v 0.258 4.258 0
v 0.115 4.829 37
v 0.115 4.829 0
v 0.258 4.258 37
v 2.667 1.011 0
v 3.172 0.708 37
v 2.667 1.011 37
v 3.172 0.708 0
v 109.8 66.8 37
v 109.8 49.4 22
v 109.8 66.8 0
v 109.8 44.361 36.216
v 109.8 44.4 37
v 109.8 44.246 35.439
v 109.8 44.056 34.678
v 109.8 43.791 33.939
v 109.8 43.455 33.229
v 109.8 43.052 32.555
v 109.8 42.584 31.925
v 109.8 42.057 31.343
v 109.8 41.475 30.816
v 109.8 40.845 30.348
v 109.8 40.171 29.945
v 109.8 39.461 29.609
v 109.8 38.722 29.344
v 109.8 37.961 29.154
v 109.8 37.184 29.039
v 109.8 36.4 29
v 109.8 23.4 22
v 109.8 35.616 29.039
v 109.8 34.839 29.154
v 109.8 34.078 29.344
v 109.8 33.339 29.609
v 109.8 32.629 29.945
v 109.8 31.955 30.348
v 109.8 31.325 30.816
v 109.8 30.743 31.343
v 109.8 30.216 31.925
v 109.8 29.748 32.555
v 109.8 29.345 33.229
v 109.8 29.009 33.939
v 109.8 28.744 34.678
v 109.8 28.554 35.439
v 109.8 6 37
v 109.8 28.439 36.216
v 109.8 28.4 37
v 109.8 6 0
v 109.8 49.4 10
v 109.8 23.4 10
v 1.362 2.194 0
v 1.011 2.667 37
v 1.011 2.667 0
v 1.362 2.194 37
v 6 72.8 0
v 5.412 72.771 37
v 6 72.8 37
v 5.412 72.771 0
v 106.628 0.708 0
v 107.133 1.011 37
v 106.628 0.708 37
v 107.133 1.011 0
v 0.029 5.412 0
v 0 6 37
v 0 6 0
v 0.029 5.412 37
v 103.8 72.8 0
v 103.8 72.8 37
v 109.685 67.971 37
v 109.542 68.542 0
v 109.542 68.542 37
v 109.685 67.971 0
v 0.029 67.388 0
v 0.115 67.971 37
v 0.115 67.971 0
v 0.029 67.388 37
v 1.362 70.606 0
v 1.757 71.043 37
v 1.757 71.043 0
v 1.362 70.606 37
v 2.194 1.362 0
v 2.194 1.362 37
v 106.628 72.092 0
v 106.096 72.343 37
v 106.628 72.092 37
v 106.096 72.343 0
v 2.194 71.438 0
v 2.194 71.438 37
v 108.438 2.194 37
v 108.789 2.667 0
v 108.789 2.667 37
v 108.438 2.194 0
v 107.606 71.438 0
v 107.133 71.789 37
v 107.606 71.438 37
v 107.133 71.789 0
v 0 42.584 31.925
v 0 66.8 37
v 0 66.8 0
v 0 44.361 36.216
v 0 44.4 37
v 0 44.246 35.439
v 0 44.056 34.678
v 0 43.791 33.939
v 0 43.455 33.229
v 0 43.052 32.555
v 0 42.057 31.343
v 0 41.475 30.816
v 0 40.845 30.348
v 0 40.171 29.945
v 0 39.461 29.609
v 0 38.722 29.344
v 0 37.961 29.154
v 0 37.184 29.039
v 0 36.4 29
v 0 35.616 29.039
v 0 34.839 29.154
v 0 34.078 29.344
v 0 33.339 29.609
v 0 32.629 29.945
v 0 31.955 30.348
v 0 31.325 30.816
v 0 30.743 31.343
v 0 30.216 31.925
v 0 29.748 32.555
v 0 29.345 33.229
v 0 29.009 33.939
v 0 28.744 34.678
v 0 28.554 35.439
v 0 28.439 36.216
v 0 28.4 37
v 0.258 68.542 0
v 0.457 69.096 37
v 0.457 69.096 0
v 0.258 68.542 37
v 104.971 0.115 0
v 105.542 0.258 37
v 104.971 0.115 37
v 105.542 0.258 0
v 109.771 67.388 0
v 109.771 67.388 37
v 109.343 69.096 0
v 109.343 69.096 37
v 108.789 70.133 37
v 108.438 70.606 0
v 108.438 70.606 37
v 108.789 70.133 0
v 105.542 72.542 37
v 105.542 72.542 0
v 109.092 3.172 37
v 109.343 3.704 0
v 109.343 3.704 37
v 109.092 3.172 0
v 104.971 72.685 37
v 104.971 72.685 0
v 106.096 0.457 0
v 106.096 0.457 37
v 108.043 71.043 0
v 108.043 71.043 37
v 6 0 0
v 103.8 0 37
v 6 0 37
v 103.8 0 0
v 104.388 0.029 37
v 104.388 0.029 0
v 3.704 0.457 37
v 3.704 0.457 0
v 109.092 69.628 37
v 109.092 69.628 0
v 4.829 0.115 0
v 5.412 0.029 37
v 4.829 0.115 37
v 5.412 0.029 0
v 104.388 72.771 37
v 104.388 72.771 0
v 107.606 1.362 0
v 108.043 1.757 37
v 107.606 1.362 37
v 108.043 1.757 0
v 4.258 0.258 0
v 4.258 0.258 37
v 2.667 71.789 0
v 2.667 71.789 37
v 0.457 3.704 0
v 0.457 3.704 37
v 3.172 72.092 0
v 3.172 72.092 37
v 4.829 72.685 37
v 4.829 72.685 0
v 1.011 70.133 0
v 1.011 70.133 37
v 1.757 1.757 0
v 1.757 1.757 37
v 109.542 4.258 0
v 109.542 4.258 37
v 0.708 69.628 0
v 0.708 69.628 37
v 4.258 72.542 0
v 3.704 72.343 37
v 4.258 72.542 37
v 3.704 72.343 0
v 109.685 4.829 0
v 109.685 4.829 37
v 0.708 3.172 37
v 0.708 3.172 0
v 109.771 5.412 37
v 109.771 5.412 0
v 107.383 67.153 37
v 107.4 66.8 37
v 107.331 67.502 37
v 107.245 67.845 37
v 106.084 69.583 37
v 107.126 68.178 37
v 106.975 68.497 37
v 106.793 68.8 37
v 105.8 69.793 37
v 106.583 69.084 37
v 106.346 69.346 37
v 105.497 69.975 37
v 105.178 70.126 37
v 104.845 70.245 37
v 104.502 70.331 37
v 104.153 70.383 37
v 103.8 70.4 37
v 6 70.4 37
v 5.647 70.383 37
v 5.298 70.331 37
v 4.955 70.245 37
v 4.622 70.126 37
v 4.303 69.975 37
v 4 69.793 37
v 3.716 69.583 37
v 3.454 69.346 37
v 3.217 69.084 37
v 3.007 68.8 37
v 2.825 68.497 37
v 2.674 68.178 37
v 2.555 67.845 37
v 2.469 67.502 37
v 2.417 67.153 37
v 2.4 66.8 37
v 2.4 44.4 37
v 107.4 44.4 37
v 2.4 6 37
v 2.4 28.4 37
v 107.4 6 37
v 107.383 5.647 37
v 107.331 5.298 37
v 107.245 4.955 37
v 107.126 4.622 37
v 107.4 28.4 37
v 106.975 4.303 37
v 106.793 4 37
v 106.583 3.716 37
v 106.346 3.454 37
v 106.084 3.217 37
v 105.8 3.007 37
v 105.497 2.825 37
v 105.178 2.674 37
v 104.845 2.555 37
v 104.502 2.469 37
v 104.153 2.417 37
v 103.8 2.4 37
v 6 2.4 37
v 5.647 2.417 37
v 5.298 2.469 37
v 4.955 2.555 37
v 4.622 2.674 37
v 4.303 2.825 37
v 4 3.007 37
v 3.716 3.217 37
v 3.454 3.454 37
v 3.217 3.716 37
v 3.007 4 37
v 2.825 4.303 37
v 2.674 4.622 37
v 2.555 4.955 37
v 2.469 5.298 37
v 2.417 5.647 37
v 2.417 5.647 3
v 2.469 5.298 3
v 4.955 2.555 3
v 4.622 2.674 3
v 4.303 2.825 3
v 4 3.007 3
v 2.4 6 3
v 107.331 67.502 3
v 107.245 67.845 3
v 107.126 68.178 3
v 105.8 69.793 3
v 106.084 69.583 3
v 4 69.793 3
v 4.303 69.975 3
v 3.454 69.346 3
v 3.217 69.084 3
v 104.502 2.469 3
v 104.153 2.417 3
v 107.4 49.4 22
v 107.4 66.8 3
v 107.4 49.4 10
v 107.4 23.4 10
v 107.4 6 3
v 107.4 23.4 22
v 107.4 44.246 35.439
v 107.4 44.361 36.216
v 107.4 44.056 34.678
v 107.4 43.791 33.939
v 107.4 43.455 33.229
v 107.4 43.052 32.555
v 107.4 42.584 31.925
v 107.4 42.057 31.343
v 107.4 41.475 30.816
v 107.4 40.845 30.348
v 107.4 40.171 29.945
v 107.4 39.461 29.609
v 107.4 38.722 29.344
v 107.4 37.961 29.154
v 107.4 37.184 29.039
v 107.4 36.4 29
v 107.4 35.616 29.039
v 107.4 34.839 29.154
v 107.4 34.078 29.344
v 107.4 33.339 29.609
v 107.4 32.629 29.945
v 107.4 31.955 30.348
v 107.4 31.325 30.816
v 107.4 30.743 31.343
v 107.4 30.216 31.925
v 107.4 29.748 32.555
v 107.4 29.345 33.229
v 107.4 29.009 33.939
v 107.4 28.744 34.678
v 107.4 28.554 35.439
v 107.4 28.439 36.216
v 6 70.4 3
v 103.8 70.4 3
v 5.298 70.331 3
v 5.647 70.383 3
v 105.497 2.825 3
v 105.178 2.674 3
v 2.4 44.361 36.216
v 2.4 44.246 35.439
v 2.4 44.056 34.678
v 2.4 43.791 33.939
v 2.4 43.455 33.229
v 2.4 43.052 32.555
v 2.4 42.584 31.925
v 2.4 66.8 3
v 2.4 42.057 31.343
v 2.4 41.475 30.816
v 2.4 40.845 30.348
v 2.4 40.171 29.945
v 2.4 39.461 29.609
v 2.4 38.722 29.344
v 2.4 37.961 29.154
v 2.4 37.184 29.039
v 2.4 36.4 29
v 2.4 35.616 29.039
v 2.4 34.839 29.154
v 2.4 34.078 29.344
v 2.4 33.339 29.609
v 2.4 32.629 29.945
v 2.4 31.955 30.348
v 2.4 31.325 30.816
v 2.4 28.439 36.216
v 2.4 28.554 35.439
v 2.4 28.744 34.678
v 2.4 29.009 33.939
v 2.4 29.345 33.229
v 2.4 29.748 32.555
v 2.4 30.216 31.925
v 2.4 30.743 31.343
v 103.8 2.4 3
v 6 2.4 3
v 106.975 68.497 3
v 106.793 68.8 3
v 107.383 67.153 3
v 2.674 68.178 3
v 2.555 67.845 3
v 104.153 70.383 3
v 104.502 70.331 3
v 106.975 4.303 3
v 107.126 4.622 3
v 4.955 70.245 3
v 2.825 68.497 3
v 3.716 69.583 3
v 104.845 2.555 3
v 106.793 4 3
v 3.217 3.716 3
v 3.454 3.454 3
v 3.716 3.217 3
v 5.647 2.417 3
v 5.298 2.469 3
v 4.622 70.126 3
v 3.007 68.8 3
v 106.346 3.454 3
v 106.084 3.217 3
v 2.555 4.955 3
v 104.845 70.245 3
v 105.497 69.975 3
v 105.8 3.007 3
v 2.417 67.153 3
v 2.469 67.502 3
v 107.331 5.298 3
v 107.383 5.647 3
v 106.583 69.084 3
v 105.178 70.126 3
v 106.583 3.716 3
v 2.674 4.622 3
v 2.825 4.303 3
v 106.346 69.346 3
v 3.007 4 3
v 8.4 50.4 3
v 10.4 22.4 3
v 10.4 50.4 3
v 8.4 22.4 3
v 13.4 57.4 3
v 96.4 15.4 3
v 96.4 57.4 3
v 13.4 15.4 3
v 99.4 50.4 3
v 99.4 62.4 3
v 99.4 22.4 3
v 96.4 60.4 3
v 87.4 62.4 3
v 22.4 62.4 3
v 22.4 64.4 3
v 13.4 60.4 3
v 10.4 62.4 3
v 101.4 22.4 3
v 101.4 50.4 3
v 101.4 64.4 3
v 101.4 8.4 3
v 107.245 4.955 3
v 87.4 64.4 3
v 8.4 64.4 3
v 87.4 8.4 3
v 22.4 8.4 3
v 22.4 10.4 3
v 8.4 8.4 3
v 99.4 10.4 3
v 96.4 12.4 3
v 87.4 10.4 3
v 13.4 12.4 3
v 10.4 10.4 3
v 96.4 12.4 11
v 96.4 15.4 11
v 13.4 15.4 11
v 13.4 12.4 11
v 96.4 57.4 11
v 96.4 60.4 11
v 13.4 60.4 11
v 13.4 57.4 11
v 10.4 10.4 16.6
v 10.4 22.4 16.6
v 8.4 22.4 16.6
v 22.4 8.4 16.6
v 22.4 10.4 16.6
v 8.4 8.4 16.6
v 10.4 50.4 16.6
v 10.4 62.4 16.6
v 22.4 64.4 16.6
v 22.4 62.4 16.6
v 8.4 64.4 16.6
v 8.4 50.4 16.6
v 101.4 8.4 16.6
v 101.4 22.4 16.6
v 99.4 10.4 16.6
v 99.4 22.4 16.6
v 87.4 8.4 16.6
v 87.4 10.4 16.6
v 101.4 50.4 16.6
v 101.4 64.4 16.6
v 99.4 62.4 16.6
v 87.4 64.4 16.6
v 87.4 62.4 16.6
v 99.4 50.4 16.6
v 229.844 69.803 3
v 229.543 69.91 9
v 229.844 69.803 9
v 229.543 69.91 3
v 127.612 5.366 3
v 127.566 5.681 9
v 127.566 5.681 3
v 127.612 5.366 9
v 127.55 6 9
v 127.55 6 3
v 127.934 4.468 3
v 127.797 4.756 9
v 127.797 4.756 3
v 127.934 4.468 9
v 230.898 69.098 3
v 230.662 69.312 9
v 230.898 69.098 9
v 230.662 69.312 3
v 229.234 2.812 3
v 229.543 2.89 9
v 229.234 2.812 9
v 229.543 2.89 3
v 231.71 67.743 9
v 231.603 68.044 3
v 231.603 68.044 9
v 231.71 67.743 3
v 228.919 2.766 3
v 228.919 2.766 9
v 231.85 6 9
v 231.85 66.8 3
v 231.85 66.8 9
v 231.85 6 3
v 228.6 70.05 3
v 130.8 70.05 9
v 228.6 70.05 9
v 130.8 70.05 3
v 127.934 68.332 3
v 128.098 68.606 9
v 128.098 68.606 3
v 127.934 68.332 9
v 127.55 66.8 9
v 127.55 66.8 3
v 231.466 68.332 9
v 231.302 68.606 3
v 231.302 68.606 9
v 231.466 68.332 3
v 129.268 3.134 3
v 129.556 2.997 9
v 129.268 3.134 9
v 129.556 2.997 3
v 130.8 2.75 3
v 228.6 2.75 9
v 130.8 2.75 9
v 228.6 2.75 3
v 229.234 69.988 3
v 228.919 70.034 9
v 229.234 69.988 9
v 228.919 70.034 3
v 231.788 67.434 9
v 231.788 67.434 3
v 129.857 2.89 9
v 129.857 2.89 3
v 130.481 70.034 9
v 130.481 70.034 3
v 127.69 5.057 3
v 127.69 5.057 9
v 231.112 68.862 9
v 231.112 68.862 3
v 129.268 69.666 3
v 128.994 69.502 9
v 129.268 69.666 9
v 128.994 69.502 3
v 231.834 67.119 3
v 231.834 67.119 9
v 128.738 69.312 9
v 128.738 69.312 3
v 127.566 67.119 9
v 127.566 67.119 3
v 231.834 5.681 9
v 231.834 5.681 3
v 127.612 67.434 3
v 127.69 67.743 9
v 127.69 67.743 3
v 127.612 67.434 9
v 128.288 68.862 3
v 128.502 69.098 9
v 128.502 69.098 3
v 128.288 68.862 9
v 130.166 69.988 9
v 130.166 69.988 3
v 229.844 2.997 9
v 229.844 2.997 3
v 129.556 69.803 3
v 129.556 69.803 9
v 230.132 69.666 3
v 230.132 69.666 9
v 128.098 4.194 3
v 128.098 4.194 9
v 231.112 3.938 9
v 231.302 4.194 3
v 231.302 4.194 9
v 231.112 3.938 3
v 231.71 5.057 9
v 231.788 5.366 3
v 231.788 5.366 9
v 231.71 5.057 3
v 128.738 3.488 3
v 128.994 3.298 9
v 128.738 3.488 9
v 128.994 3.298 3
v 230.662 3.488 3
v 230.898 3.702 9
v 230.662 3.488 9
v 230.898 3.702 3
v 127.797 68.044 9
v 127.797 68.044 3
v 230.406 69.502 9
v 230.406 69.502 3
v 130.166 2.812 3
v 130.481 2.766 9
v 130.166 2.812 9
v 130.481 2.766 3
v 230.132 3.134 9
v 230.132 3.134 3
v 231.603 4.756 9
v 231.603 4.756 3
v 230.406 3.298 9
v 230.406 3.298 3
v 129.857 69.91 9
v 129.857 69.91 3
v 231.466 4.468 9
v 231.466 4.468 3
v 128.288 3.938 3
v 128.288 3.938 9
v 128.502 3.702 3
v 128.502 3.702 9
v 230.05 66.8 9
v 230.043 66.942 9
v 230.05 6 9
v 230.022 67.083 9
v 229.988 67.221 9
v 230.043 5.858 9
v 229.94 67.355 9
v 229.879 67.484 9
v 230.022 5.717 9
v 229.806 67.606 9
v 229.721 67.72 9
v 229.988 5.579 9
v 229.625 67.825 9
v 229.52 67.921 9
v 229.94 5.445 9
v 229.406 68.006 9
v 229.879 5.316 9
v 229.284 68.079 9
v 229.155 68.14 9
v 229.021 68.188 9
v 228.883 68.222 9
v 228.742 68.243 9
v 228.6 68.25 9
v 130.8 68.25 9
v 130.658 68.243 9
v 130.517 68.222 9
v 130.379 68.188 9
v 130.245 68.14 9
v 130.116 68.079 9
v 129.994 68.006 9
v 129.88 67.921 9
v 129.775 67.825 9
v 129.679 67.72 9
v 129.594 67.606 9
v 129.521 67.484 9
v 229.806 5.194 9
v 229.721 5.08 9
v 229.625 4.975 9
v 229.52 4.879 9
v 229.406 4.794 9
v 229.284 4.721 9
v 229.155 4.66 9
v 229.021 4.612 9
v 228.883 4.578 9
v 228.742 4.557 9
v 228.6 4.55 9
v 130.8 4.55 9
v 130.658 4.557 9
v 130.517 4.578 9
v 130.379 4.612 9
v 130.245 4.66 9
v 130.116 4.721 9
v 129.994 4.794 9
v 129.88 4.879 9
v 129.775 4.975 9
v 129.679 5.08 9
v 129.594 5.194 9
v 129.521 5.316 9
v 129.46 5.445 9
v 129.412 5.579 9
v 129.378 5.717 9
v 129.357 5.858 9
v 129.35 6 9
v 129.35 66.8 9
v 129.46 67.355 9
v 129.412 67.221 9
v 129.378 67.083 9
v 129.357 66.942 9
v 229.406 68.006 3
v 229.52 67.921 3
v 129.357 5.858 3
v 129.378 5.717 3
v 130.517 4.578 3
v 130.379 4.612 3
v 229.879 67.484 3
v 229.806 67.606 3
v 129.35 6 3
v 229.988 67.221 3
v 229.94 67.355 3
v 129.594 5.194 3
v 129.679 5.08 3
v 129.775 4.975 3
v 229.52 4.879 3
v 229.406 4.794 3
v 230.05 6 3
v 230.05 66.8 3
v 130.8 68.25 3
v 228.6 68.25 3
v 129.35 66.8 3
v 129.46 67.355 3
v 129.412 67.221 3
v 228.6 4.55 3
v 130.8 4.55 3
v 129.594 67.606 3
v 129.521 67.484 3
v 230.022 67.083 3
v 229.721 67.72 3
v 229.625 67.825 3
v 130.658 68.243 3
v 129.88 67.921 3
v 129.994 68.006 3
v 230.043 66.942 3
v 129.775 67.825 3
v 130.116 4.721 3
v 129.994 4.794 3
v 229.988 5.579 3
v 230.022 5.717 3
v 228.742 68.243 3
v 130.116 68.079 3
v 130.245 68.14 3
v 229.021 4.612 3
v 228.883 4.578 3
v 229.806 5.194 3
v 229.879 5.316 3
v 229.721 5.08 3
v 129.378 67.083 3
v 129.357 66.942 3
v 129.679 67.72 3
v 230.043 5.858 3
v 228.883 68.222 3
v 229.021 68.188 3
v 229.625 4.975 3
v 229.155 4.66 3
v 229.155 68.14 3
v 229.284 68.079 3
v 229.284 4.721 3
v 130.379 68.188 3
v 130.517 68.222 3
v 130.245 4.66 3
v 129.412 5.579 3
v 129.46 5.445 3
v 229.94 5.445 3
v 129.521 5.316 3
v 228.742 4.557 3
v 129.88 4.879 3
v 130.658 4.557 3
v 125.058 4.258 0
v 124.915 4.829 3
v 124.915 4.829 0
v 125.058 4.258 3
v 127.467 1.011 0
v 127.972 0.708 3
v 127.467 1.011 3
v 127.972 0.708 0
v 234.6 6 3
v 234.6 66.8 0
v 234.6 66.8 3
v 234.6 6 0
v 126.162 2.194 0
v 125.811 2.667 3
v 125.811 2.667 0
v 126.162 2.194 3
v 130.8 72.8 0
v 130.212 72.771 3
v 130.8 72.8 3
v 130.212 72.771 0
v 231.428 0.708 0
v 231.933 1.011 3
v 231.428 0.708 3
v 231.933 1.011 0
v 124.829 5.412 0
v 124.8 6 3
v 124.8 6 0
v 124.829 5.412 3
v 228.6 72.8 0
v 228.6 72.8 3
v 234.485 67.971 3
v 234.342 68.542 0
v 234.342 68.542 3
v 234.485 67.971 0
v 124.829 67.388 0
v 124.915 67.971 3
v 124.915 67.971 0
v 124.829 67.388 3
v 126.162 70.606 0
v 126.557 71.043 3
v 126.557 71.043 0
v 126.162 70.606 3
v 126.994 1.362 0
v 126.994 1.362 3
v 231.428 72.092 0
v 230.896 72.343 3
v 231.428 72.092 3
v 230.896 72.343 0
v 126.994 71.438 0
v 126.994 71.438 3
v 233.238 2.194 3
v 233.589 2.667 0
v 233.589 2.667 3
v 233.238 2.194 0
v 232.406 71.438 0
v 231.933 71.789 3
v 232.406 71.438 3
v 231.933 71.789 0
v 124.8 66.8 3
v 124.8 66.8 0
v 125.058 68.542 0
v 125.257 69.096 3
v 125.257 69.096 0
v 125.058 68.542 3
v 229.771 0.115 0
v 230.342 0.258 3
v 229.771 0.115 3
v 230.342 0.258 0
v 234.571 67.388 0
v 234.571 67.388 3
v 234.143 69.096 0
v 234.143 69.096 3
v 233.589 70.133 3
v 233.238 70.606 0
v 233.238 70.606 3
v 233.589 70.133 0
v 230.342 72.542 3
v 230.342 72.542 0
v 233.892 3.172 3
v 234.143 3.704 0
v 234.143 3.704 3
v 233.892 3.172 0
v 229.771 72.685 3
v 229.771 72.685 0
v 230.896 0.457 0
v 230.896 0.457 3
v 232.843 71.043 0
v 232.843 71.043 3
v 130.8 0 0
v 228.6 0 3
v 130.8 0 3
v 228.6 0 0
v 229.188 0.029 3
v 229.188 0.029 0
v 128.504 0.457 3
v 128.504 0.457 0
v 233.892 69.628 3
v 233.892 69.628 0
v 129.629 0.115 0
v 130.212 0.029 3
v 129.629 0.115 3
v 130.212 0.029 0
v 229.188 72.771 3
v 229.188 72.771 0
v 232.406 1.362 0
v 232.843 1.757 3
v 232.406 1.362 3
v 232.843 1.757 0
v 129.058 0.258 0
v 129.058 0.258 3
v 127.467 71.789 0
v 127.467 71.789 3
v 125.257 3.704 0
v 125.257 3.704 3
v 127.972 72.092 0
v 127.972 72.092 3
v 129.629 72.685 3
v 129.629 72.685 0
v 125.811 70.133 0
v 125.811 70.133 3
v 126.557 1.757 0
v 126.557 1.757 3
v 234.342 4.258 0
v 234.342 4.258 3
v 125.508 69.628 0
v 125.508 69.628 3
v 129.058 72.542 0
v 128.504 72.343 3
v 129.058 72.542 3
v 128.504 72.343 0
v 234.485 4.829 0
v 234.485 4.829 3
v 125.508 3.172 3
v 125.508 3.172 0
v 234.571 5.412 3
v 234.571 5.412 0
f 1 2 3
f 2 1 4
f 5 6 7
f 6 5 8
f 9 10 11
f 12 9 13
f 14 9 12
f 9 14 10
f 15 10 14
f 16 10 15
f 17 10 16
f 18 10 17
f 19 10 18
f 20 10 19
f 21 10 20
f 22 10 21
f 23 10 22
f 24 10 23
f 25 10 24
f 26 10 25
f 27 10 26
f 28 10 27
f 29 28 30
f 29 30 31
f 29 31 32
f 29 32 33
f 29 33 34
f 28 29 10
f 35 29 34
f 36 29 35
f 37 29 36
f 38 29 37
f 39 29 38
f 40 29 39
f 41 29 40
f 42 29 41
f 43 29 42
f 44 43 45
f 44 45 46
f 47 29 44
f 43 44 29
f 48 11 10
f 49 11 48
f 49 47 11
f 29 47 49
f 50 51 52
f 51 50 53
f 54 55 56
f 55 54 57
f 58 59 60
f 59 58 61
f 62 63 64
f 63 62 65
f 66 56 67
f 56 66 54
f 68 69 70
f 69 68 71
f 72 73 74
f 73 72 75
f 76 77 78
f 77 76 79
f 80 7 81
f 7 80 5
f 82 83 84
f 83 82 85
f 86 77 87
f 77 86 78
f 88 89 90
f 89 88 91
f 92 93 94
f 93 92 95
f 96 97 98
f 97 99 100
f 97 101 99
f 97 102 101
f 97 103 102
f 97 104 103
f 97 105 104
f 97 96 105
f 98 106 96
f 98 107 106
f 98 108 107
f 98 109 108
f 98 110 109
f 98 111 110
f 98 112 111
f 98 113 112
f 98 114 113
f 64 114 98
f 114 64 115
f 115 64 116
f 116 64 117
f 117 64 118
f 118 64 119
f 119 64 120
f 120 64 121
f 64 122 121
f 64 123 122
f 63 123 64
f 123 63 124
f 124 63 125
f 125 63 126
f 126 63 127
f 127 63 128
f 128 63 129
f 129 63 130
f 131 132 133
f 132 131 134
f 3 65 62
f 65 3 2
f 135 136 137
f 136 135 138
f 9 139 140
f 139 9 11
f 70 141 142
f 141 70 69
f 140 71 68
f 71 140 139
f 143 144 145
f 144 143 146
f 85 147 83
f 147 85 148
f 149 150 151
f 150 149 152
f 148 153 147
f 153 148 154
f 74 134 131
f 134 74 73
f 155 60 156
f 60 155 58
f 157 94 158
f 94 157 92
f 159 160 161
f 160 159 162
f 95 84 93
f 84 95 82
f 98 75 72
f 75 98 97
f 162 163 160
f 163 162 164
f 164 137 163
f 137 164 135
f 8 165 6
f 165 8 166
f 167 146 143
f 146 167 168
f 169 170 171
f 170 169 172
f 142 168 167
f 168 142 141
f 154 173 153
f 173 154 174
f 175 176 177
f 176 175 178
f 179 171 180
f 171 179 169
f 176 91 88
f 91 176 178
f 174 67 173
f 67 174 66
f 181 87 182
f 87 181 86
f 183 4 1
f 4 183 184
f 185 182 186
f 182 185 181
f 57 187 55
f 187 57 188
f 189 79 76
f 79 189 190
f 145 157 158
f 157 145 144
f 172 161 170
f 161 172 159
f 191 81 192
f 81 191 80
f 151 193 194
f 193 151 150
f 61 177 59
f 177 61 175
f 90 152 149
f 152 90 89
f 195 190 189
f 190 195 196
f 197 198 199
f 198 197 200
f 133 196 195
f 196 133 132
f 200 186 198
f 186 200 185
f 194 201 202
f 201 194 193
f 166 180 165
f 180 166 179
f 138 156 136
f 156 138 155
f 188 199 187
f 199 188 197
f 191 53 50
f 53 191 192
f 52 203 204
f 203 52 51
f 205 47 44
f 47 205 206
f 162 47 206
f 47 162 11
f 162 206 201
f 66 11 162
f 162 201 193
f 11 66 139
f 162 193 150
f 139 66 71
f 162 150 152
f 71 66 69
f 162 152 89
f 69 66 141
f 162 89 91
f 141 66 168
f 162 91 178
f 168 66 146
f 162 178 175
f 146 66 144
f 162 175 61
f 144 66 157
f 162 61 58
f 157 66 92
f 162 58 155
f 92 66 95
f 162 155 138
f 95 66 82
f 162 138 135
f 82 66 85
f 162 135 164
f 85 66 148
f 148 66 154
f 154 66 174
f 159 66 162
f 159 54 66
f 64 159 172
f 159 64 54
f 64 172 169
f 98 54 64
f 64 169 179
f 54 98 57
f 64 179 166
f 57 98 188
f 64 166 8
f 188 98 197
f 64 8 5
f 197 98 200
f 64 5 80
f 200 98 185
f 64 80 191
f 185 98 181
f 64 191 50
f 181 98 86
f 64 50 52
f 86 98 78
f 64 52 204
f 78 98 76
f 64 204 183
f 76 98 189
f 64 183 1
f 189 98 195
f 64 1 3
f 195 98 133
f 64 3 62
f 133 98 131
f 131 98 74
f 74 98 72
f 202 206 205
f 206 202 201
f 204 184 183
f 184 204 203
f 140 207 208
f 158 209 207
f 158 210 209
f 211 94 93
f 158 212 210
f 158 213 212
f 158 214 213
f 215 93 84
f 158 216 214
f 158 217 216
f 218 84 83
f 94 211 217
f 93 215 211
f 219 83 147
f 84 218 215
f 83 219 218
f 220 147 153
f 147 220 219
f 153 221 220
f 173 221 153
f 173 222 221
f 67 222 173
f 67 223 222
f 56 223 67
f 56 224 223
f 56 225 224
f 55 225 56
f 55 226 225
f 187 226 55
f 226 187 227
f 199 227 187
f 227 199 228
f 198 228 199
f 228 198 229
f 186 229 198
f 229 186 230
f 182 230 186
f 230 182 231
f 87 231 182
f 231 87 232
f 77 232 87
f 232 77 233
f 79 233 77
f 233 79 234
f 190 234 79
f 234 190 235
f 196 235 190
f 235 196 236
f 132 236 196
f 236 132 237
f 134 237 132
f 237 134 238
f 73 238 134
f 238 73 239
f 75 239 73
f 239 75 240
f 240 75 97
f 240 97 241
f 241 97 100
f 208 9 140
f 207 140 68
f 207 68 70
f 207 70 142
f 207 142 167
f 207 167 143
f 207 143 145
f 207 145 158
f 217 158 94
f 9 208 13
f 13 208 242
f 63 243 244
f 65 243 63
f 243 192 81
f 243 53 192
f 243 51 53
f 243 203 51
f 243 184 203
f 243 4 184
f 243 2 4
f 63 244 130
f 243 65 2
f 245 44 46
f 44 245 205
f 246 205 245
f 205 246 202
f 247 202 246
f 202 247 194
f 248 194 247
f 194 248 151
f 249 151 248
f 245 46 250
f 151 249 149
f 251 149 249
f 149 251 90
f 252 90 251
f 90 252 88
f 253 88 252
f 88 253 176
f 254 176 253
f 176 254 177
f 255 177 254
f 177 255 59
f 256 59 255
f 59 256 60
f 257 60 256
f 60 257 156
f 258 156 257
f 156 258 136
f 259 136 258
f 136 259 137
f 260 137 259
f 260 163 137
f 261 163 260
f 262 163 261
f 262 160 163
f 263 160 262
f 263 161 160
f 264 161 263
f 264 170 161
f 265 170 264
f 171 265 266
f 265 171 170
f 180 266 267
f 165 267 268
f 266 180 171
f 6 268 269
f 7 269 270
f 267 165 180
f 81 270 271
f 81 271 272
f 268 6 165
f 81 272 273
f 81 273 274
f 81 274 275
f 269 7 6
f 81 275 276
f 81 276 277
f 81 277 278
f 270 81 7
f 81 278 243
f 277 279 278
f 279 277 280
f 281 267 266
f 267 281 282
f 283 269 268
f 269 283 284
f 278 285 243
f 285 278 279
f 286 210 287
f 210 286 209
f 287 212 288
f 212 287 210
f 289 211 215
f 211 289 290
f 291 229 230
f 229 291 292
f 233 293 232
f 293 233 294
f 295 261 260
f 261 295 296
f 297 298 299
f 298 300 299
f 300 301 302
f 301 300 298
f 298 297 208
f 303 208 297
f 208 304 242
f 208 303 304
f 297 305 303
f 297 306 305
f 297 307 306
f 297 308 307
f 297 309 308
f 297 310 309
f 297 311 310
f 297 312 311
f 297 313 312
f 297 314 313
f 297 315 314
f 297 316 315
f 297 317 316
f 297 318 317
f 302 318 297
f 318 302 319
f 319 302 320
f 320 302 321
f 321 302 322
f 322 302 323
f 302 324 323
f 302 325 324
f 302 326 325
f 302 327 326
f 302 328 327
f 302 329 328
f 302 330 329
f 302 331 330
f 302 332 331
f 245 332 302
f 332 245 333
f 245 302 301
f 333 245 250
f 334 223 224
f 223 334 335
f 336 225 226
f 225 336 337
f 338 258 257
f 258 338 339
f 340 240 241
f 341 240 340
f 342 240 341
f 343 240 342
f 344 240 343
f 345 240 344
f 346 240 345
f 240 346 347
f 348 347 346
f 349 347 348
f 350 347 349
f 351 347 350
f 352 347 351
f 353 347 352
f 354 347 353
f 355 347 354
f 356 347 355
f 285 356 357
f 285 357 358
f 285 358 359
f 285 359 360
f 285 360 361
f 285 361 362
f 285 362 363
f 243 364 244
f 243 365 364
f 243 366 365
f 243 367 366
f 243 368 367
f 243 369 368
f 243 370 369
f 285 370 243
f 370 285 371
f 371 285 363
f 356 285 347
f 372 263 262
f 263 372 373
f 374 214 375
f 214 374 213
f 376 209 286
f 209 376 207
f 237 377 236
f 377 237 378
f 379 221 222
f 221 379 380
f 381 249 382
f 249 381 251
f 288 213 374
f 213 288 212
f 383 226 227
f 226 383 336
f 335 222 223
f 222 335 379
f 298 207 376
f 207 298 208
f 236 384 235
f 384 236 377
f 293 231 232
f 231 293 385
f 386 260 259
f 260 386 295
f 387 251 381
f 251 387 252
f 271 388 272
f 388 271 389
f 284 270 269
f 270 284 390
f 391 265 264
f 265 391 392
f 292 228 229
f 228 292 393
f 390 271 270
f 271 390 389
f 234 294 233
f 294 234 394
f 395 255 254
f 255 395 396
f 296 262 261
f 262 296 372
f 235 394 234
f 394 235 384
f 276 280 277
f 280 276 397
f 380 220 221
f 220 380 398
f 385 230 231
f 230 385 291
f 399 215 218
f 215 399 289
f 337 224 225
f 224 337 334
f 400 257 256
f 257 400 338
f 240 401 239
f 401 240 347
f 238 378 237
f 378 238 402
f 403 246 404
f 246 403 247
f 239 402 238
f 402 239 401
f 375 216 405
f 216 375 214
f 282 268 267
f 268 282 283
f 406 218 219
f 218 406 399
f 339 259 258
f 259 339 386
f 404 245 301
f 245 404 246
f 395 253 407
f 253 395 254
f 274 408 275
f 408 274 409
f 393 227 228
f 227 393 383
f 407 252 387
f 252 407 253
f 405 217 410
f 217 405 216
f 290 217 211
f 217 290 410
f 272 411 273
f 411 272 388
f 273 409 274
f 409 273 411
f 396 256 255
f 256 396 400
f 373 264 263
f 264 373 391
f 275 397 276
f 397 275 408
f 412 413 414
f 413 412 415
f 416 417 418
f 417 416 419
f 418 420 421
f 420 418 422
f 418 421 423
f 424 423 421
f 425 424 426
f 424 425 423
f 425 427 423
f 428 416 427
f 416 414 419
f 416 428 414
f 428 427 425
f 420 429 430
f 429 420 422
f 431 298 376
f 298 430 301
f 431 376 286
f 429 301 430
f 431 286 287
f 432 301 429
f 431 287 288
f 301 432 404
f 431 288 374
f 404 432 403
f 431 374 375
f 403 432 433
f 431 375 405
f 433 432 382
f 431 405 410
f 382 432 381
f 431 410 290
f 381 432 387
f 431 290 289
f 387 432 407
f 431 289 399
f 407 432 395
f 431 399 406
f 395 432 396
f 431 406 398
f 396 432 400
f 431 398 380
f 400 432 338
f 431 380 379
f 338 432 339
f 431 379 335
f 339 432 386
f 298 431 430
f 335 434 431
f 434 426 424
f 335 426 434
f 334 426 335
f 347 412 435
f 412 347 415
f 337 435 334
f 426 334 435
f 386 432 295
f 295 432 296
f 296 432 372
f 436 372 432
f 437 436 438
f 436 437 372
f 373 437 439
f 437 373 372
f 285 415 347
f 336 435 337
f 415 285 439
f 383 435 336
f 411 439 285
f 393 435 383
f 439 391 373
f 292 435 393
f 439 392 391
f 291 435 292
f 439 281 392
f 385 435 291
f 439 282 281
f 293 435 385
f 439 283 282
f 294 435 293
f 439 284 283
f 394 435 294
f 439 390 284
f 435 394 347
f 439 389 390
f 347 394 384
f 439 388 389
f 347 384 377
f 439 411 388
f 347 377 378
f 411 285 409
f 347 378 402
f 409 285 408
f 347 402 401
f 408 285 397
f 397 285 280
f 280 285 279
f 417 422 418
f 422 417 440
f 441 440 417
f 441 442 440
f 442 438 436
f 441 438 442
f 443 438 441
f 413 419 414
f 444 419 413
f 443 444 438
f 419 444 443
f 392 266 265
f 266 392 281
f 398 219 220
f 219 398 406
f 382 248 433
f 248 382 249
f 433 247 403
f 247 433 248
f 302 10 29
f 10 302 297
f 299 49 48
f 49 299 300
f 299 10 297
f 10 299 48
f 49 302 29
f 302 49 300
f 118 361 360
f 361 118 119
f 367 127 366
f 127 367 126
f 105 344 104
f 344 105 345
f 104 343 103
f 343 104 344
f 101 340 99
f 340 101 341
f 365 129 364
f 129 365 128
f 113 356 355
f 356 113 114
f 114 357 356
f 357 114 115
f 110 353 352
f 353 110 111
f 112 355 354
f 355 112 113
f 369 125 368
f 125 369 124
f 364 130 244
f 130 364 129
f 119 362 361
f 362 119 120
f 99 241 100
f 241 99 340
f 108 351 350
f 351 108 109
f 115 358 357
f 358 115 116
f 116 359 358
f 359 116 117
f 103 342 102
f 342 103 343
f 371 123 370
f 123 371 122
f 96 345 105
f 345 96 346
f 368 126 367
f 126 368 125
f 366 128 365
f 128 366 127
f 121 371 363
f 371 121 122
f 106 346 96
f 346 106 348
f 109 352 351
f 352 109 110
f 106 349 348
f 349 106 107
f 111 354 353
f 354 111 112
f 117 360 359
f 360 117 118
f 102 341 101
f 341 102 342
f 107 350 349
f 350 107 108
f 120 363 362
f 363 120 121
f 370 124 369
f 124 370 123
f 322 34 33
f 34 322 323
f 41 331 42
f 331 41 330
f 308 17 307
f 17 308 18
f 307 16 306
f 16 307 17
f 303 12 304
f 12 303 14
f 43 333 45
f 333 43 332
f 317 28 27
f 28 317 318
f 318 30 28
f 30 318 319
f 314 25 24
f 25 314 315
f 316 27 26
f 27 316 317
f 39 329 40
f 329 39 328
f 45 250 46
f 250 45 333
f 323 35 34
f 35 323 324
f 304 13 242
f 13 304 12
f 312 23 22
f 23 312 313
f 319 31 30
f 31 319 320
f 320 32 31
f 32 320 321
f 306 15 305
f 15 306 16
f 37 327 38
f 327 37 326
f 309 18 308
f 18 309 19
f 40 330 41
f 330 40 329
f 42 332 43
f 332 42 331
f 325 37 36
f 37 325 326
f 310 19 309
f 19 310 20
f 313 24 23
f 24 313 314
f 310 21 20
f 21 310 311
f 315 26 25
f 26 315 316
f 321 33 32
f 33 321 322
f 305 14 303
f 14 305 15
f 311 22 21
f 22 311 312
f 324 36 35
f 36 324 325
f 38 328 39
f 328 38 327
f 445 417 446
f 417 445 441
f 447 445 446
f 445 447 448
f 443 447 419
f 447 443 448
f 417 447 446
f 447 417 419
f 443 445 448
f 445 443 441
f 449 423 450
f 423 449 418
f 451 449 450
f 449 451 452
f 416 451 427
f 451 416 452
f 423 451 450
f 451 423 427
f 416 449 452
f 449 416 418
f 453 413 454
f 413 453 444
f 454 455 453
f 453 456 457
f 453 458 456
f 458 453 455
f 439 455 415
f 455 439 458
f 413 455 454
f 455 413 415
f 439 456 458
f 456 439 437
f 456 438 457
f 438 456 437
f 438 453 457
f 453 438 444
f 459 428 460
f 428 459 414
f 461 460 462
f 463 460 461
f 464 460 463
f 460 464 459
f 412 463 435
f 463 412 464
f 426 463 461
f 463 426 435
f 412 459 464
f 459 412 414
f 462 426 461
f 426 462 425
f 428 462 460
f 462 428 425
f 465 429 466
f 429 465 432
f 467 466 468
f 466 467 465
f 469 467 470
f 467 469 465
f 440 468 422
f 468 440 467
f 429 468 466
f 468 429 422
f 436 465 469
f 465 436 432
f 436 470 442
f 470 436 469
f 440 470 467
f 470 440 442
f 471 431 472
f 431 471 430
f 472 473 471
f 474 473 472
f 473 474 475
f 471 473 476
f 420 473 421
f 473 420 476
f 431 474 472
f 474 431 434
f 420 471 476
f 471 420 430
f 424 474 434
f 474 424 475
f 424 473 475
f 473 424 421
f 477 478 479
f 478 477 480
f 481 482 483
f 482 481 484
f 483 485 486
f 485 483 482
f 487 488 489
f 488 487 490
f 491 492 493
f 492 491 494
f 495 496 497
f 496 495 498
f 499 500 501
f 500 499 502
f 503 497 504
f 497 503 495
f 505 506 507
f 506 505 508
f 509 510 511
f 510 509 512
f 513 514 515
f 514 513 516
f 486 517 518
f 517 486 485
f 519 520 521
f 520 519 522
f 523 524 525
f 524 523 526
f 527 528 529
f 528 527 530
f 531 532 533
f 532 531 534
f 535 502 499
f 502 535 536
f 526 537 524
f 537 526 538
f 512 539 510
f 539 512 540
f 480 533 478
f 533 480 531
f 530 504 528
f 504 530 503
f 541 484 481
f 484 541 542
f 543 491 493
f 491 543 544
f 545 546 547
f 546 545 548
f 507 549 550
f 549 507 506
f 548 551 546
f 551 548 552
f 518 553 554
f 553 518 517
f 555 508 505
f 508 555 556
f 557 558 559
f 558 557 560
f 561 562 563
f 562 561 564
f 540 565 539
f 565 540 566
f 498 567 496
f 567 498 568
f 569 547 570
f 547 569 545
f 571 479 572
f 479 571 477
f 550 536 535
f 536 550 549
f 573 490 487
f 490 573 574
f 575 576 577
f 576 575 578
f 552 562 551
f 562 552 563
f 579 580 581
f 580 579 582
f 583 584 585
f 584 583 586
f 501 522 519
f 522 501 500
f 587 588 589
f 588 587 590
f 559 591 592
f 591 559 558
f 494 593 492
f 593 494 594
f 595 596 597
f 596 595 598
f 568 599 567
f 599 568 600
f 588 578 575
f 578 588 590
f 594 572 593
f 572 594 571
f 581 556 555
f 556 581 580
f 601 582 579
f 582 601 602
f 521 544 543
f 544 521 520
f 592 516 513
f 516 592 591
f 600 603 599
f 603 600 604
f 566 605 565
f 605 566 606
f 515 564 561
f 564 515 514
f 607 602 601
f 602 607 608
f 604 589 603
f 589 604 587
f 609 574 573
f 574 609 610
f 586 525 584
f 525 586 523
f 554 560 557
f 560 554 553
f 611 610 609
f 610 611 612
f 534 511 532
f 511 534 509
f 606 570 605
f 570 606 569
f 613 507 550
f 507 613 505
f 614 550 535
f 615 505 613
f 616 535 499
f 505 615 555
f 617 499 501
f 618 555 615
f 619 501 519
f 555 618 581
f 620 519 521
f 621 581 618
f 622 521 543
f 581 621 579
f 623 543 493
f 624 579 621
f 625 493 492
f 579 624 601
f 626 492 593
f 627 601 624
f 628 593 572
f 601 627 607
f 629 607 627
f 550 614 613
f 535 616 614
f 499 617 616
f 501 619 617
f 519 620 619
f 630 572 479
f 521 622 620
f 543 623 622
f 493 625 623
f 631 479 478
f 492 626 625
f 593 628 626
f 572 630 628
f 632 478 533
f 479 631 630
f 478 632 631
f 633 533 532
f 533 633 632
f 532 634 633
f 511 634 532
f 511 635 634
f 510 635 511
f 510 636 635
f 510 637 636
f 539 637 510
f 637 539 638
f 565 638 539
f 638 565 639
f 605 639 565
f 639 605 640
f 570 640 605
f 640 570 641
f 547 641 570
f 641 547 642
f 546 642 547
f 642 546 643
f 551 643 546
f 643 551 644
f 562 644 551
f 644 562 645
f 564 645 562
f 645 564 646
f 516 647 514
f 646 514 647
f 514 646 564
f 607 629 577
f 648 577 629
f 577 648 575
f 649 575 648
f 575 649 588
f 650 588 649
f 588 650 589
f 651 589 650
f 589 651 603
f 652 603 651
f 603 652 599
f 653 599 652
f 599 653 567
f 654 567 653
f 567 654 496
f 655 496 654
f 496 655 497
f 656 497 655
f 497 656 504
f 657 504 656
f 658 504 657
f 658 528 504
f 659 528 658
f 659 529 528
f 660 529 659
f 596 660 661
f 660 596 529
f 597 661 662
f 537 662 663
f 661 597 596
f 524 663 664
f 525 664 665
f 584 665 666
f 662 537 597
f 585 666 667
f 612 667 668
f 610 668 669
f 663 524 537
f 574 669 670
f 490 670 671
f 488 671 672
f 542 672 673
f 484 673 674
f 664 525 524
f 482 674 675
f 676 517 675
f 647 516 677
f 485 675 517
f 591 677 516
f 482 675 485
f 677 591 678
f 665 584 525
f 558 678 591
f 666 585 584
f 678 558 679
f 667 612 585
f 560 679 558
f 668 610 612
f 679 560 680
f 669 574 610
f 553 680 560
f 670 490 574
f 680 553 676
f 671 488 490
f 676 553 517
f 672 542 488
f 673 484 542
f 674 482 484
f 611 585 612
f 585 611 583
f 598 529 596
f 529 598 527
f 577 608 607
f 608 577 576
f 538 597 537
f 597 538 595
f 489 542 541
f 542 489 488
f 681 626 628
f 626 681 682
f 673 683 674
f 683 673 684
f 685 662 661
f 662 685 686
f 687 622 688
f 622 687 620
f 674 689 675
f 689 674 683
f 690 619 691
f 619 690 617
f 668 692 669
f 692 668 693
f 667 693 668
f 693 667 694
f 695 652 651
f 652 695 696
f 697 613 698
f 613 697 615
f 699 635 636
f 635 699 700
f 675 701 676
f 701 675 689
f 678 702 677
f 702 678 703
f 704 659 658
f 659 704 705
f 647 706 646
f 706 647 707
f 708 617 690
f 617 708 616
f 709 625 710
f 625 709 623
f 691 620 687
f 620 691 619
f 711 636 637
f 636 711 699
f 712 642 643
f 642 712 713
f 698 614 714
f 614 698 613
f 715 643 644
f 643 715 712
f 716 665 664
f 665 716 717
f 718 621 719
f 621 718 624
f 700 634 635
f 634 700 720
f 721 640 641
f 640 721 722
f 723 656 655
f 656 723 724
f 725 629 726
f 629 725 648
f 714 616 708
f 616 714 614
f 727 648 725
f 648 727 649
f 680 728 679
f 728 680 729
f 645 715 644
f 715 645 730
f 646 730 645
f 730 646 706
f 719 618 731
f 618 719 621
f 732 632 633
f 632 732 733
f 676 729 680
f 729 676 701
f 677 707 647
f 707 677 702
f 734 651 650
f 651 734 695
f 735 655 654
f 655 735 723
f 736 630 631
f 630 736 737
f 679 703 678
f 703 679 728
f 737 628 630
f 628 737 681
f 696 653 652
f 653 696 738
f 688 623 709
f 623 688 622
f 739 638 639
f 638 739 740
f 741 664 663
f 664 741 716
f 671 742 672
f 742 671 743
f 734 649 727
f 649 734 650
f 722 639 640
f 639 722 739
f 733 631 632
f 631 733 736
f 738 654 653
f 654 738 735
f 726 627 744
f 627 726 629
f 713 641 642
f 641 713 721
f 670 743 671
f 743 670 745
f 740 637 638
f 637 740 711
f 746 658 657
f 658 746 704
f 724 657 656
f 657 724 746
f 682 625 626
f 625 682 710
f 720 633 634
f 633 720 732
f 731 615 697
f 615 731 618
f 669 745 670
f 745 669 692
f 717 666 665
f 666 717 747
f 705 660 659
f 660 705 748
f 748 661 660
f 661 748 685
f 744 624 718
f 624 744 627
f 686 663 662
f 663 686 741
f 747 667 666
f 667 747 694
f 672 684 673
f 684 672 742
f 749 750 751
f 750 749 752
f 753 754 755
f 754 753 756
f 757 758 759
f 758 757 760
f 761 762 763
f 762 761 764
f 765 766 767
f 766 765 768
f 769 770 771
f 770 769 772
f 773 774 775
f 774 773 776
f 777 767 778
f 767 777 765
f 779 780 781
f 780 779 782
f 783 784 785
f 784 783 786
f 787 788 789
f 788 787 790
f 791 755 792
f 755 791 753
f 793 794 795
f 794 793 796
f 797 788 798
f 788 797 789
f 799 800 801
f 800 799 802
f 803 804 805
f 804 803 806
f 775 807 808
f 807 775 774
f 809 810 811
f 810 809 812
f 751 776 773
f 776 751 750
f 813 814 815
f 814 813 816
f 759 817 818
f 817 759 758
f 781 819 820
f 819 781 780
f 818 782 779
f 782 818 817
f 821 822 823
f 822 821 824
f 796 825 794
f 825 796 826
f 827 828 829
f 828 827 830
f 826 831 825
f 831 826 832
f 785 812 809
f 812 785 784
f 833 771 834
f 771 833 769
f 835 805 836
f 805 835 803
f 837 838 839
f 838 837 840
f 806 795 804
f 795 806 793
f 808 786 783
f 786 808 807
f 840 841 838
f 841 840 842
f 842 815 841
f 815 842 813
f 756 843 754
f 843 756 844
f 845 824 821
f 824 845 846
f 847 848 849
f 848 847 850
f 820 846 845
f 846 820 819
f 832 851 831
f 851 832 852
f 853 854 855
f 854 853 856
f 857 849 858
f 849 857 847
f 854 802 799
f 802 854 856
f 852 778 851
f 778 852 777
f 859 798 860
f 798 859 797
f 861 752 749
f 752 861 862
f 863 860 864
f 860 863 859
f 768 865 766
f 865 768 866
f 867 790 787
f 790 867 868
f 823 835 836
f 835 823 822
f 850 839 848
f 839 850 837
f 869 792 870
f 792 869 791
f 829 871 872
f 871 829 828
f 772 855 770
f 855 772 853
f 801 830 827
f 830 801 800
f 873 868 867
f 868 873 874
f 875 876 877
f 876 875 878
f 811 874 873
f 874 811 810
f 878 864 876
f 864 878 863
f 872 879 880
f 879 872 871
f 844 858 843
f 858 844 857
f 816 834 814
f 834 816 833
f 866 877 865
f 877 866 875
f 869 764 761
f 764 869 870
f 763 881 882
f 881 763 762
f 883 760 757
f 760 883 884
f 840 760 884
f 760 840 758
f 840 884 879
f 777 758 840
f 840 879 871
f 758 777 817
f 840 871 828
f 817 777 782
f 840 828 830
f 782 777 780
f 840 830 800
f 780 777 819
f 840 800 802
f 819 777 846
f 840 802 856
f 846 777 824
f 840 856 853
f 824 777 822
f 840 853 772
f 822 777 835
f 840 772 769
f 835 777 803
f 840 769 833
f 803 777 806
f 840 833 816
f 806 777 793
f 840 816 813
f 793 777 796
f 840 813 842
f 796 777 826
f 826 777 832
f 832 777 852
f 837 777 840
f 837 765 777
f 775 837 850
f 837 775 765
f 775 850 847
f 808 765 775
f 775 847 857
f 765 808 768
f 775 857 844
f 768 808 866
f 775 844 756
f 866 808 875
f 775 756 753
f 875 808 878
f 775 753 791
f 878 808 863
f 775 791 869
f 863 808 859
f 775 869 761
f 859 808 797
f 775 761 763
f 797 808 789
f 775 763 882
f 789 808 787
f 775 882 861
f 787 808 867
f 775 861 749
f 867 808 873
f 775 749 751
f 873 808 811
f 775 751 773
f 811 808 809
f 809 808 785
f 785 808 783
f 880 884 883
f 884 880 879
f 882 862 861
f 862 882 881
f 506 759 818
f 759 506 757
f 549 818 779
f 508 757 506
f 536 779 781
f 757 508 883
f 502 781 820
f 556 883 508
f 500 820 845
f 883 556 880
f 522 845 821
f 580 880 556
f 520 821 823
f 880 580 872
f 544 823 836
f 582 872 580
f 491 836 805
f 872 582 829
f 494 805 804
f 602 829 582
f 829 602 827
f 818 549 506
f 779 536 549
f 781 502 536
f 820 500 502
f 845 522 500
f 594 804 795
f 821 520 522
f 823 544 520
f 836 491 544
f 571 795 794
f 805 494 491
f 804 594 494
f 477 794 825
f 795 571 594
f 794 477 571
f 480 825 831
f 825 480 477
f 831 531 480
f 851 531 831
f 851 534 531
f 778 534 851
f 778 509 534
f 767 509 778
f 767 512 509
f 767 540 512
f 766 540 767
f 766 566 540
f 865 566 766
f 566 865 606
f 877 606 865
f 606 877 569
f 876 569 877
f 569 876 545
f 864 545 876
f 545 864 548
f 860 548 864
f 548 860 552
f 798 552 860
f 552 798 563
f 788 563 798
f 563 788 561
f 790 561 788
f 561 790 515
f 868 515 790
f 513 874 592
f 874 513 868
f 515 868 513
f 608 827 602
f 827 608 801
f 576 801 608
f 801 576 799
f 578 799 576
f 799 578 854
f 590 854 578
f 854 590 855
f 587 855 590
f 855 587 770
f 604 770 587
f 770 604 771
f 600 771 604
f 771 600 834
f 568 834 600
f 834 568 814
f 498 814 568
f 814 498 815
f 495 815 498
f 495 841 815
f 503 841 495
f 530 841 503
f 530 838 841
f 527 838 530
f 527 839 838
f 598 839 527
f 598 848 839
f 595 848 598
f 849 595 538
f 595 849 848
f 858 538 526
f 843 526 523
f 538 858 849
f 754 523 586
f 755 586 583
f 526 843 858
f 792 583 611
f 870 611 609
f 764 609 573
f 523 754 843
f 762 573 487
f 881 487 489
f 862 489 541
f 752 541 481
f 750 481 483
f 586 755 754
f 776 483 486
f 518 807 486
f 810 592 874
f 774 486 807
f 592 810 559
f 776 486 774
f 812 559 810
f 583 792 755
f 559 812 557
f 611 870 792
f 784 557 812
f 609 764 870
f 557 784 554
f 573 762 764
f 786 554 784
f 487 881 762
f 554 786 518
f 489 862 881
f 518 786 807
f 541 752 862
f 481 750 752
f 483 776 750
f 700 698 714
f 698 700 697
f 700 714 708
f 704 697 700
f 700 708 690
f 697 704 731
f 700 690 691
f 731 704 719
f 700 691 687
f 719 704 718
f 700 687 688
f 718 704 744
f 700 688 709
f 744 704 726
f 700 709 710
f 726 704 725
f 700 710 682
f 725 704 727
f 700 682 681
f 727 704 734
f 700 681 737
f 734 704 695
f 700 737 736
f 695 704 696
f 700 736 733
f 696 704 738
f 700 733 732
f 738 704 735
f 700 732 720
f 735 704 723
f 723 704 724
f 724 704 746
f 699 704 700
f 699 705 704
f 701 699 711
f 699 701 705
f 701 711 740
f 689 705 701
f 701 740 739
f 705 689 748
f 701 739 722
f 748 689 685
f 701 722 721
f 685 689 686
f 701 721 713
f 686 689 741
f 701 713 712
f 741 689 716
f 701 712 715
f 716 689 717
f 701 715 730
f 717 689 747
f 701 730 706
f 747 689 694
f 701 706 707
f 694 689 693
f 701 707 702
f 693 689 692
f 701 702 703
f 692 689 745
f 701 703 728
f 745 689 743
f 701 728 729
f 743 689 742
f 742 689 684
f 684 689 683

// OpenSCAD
/*
ED-4 parametric perfboard enclosure
Author: Trishan Biswas
Created: 16 October 2026

The enclosure holds one 89 mm by 52 mm perfboard and routes the Arduino harness
through a single side opening. Dimensions are in millimetres.

Set part to "base", "lid", "assembled" or "layout" before rendering.
The default layout places both printable parts on the build plane.
*/

$fn = 64;

part = "layout";
// Numeric override for command-line exports where shell quoting is awkward:
// 0 = base, 1 = lid, 2 = assembled preview, 3 = print layout.
part_id = -1;

// Measured board envelope.
board_length = 89;
board_width = 52;
board_thickness = 1.6;

// Enclosure sizing.
board_side_clearance = 8;
internal_height = 34;       // Gives 24.4 mm above the supported perfboard.
wall = 2.4;
floor_thickness = 3;
lid_top_thickness = 3;
outer_corner_radius = 6;

// Board support and restraint.
support_height = 8;
support_rail_width = 3;
corner_guide_thickness = 2;
corner_guide_length = 12;
corner_guide_above_board = 4;

// Lid fit. Increase this if the first print is too tight.
lid_clearance_per_side = 0.35;
lid_lip_depth = 6;
lid_lip_wall = 1.8;

// Five-wire Arduino harness: 5 V, 3.3 V, GND, A0 and D7.
cable_slot_width = 26;
cable_slot_height = 12;
cable_slot_floor = floor_thickness + support_height - 1;

// Derived dimensions.
inner_length = board_length + 2 * board_side_clearance;
inner_width = board_width + 2 * board_side_clearance;
outer_length = inner_length + 2 * wall;
outer_width = inner_width + 2 * wall;
base_height = floor_thickness + internal_height;

board_x = wall + board_side_clearance;
board_y = wall + board_side_clearance;
board_z = floor_thickness + support_height;

module rounded_rectangle(size_x, size_y, radius) {
    hull() {
        translate([radius, radius]) circle(r = radius);
        translate([size_x - radius, radius]) circle(r = radius);
        translate([radius, size_y - radius]) circle(r = radius);
        translate([size_x - radius, size_y - radius]) circle(r = radius);
    }
}

module rounded_prism(size_x, size_y, height, radius) {
    linear_extrude(height = height)
        rounded_rectangle(size_x, size_y, radius);
}

module base_shell() {
    difference() {
        rounded_prism(
            outer_length,
            outer_width,
            base_height,
            outer_corner_radius
        );

        // Main internal cavity. Extending the cut above the body leaves an
        // open top while retaining the specified floor thickness.
        translate([wall, wall, floor_thickness])
            rounded_prism(
                inner_length,
                inner_width,
                internal_height + 1,
                max(outer_corner_radius - wall, 1)
            );

        // One bundle opening on the Arduino-facing short wall. It is wide
        // enough for five individual Dupont-style leads or a sleeved bundle.
        translate([
            outer_length - wall - 1,
            (outer_width - cable_slot_width) / 2,
            cable_slot_floor
        ])
            cube([
                wall + 2,
                cable_slot_width,
                cable_slot_height
            ]);

        // Two shallow thumb notches make the friction-fit lid easier to lift.
        translate([-1, outer_width / 2, base_height])
            rotate([0, 90, 0])
                cylinder(h = wall + 2, r = 8);
        translate([outer_length - wall - 1, outer_width / 2, base_height])
            rotate([0, 90, 0])
                cylinder(h = wall + 2, r = 8);
    }
}

module support_rails() {
    // Two rails support the long edges without relying on mounting-hole
    // positions. They also leave an air gap beneath the perfboard.
    for (rail_y = [
        board_y + 2,
        board_y + board_width - support_rail_width - 2
    ]) {
        translate([
            board_x + 3,
            rail_y,
            floor_thickness - 0.1
        ])
            cube([
                board_length - 6,
                support_rail_width,
                support_height + 0.1
            ]);
    }
}

module corner_guide(x_side, y_side) {
    guide_height = support_height + board_thickness + corner_guide_above_board;
    x0 = x_side == 0
        ? board_x - corner_guide_thickness
        : board_x + board_length;
    y0 = y_side == 0
        ? board_y - corner_guide_thickness
        : board_y + board_width;
    x_arm = x_side == 0
        ? board_x - corner_guide_thickness
        : board_x + board_length - corner_guide_length;
    y_arm = y_side == 0
        ? board_y - corner_guide_thickness
        : board_y + board_width - corner_guide_length;

    // The L-shaped guides stop lateral movement while leaving the board free
    // to lift out during development.
    translate([x0, y_arm, floor_thickness - 0.1])
        cube([
            corner_guide_thickness,
            corner_guide_length + corner_guide_thickness,
            guide_height + 0.1
        ]);

    translate([x_arm, y0, floor_thickness - 0.1])
        cube([
            corner_guide_length + corner_guide_thickness,
            corner_guide_thickness,
            guide_height + 0.1
        ]);
}

module base() {
    union() {
        base_shell();
        support_rails();
        for (x_side = [0, 1])
            for (y_side = [0, 1])
                corner_guide(x_side, y_side);
    }
}

module lid() {
    lip_outer_length = inner_length - 2 * lid_clearance_per_side;
    lip_outer_width = inner_width - 2 * lid_clearance_per_side;
    lip_radius = max(outer_corner_radius - wall - lid_clearance_per_side, 1);

    union() {
        // Print this outer face directly on the build plate. The locating lip
        // rises above it and faces into the enclosure after assembly.
        rounded_prism(
            outer_length,
            outer_width,
            lid_top_thickness,
            outer_corner_radius
        );

        translate([
            wall + lid_clearance_per_side,
            wall + lid_clearance_per_side,
            lid_top_thickness - 0.1
        ])
            difference() {
                rounded_prism(
                    lip_outer_length,
                    lip_outer_width,
                    lid_lip_depth + 0.1,
                    lip_radius
                );
                translate([lid_lip_wall, lid_lip_wall, -0.1])
                    rounded_prism(
                        lip_outer_length - 2 * lid_lip_wall,
                        lip_outer_width - 2 * lid_lip_wall,
                        lid_lip_depth + 0.3,
                        max(lip_radius - lid_lip_wall, 0.8)
                    );
            }
    }
}

module board_preview() {
    color([0.12, 0.48, 0.22, 0.65])
        translate([board_x, board_y, board_z])
            cube([board_length, board_width, board_thickness]);
}

module assembled_preview() {
    color([0.82, 0.84, 0.88]) base();
    board_preview();

    // The lid is shown transparent and flipped into its assembled position.
    color([0.65, 0.72, 0.82, 0.35])
        translate([0, outer_width, base_height + lid_top_thickness])
            rotate([180, 0, 0])
                lid();
}

selected_part = part_id == 0 ? "base"
    : part_id == 1 ? "lid"
    : part_id == 2 ? "assembled"
    : part_id == 3 ? "layout"
    : part;

if (selected_part == "base") {
    base();
} else if (selected_part == "lid") {
    lid();
} else if (selected_part == "assembled") {
    assembled_preview();
} else {
    base();
    translate([outer_length + 15, 0, 0]) lid();
}
